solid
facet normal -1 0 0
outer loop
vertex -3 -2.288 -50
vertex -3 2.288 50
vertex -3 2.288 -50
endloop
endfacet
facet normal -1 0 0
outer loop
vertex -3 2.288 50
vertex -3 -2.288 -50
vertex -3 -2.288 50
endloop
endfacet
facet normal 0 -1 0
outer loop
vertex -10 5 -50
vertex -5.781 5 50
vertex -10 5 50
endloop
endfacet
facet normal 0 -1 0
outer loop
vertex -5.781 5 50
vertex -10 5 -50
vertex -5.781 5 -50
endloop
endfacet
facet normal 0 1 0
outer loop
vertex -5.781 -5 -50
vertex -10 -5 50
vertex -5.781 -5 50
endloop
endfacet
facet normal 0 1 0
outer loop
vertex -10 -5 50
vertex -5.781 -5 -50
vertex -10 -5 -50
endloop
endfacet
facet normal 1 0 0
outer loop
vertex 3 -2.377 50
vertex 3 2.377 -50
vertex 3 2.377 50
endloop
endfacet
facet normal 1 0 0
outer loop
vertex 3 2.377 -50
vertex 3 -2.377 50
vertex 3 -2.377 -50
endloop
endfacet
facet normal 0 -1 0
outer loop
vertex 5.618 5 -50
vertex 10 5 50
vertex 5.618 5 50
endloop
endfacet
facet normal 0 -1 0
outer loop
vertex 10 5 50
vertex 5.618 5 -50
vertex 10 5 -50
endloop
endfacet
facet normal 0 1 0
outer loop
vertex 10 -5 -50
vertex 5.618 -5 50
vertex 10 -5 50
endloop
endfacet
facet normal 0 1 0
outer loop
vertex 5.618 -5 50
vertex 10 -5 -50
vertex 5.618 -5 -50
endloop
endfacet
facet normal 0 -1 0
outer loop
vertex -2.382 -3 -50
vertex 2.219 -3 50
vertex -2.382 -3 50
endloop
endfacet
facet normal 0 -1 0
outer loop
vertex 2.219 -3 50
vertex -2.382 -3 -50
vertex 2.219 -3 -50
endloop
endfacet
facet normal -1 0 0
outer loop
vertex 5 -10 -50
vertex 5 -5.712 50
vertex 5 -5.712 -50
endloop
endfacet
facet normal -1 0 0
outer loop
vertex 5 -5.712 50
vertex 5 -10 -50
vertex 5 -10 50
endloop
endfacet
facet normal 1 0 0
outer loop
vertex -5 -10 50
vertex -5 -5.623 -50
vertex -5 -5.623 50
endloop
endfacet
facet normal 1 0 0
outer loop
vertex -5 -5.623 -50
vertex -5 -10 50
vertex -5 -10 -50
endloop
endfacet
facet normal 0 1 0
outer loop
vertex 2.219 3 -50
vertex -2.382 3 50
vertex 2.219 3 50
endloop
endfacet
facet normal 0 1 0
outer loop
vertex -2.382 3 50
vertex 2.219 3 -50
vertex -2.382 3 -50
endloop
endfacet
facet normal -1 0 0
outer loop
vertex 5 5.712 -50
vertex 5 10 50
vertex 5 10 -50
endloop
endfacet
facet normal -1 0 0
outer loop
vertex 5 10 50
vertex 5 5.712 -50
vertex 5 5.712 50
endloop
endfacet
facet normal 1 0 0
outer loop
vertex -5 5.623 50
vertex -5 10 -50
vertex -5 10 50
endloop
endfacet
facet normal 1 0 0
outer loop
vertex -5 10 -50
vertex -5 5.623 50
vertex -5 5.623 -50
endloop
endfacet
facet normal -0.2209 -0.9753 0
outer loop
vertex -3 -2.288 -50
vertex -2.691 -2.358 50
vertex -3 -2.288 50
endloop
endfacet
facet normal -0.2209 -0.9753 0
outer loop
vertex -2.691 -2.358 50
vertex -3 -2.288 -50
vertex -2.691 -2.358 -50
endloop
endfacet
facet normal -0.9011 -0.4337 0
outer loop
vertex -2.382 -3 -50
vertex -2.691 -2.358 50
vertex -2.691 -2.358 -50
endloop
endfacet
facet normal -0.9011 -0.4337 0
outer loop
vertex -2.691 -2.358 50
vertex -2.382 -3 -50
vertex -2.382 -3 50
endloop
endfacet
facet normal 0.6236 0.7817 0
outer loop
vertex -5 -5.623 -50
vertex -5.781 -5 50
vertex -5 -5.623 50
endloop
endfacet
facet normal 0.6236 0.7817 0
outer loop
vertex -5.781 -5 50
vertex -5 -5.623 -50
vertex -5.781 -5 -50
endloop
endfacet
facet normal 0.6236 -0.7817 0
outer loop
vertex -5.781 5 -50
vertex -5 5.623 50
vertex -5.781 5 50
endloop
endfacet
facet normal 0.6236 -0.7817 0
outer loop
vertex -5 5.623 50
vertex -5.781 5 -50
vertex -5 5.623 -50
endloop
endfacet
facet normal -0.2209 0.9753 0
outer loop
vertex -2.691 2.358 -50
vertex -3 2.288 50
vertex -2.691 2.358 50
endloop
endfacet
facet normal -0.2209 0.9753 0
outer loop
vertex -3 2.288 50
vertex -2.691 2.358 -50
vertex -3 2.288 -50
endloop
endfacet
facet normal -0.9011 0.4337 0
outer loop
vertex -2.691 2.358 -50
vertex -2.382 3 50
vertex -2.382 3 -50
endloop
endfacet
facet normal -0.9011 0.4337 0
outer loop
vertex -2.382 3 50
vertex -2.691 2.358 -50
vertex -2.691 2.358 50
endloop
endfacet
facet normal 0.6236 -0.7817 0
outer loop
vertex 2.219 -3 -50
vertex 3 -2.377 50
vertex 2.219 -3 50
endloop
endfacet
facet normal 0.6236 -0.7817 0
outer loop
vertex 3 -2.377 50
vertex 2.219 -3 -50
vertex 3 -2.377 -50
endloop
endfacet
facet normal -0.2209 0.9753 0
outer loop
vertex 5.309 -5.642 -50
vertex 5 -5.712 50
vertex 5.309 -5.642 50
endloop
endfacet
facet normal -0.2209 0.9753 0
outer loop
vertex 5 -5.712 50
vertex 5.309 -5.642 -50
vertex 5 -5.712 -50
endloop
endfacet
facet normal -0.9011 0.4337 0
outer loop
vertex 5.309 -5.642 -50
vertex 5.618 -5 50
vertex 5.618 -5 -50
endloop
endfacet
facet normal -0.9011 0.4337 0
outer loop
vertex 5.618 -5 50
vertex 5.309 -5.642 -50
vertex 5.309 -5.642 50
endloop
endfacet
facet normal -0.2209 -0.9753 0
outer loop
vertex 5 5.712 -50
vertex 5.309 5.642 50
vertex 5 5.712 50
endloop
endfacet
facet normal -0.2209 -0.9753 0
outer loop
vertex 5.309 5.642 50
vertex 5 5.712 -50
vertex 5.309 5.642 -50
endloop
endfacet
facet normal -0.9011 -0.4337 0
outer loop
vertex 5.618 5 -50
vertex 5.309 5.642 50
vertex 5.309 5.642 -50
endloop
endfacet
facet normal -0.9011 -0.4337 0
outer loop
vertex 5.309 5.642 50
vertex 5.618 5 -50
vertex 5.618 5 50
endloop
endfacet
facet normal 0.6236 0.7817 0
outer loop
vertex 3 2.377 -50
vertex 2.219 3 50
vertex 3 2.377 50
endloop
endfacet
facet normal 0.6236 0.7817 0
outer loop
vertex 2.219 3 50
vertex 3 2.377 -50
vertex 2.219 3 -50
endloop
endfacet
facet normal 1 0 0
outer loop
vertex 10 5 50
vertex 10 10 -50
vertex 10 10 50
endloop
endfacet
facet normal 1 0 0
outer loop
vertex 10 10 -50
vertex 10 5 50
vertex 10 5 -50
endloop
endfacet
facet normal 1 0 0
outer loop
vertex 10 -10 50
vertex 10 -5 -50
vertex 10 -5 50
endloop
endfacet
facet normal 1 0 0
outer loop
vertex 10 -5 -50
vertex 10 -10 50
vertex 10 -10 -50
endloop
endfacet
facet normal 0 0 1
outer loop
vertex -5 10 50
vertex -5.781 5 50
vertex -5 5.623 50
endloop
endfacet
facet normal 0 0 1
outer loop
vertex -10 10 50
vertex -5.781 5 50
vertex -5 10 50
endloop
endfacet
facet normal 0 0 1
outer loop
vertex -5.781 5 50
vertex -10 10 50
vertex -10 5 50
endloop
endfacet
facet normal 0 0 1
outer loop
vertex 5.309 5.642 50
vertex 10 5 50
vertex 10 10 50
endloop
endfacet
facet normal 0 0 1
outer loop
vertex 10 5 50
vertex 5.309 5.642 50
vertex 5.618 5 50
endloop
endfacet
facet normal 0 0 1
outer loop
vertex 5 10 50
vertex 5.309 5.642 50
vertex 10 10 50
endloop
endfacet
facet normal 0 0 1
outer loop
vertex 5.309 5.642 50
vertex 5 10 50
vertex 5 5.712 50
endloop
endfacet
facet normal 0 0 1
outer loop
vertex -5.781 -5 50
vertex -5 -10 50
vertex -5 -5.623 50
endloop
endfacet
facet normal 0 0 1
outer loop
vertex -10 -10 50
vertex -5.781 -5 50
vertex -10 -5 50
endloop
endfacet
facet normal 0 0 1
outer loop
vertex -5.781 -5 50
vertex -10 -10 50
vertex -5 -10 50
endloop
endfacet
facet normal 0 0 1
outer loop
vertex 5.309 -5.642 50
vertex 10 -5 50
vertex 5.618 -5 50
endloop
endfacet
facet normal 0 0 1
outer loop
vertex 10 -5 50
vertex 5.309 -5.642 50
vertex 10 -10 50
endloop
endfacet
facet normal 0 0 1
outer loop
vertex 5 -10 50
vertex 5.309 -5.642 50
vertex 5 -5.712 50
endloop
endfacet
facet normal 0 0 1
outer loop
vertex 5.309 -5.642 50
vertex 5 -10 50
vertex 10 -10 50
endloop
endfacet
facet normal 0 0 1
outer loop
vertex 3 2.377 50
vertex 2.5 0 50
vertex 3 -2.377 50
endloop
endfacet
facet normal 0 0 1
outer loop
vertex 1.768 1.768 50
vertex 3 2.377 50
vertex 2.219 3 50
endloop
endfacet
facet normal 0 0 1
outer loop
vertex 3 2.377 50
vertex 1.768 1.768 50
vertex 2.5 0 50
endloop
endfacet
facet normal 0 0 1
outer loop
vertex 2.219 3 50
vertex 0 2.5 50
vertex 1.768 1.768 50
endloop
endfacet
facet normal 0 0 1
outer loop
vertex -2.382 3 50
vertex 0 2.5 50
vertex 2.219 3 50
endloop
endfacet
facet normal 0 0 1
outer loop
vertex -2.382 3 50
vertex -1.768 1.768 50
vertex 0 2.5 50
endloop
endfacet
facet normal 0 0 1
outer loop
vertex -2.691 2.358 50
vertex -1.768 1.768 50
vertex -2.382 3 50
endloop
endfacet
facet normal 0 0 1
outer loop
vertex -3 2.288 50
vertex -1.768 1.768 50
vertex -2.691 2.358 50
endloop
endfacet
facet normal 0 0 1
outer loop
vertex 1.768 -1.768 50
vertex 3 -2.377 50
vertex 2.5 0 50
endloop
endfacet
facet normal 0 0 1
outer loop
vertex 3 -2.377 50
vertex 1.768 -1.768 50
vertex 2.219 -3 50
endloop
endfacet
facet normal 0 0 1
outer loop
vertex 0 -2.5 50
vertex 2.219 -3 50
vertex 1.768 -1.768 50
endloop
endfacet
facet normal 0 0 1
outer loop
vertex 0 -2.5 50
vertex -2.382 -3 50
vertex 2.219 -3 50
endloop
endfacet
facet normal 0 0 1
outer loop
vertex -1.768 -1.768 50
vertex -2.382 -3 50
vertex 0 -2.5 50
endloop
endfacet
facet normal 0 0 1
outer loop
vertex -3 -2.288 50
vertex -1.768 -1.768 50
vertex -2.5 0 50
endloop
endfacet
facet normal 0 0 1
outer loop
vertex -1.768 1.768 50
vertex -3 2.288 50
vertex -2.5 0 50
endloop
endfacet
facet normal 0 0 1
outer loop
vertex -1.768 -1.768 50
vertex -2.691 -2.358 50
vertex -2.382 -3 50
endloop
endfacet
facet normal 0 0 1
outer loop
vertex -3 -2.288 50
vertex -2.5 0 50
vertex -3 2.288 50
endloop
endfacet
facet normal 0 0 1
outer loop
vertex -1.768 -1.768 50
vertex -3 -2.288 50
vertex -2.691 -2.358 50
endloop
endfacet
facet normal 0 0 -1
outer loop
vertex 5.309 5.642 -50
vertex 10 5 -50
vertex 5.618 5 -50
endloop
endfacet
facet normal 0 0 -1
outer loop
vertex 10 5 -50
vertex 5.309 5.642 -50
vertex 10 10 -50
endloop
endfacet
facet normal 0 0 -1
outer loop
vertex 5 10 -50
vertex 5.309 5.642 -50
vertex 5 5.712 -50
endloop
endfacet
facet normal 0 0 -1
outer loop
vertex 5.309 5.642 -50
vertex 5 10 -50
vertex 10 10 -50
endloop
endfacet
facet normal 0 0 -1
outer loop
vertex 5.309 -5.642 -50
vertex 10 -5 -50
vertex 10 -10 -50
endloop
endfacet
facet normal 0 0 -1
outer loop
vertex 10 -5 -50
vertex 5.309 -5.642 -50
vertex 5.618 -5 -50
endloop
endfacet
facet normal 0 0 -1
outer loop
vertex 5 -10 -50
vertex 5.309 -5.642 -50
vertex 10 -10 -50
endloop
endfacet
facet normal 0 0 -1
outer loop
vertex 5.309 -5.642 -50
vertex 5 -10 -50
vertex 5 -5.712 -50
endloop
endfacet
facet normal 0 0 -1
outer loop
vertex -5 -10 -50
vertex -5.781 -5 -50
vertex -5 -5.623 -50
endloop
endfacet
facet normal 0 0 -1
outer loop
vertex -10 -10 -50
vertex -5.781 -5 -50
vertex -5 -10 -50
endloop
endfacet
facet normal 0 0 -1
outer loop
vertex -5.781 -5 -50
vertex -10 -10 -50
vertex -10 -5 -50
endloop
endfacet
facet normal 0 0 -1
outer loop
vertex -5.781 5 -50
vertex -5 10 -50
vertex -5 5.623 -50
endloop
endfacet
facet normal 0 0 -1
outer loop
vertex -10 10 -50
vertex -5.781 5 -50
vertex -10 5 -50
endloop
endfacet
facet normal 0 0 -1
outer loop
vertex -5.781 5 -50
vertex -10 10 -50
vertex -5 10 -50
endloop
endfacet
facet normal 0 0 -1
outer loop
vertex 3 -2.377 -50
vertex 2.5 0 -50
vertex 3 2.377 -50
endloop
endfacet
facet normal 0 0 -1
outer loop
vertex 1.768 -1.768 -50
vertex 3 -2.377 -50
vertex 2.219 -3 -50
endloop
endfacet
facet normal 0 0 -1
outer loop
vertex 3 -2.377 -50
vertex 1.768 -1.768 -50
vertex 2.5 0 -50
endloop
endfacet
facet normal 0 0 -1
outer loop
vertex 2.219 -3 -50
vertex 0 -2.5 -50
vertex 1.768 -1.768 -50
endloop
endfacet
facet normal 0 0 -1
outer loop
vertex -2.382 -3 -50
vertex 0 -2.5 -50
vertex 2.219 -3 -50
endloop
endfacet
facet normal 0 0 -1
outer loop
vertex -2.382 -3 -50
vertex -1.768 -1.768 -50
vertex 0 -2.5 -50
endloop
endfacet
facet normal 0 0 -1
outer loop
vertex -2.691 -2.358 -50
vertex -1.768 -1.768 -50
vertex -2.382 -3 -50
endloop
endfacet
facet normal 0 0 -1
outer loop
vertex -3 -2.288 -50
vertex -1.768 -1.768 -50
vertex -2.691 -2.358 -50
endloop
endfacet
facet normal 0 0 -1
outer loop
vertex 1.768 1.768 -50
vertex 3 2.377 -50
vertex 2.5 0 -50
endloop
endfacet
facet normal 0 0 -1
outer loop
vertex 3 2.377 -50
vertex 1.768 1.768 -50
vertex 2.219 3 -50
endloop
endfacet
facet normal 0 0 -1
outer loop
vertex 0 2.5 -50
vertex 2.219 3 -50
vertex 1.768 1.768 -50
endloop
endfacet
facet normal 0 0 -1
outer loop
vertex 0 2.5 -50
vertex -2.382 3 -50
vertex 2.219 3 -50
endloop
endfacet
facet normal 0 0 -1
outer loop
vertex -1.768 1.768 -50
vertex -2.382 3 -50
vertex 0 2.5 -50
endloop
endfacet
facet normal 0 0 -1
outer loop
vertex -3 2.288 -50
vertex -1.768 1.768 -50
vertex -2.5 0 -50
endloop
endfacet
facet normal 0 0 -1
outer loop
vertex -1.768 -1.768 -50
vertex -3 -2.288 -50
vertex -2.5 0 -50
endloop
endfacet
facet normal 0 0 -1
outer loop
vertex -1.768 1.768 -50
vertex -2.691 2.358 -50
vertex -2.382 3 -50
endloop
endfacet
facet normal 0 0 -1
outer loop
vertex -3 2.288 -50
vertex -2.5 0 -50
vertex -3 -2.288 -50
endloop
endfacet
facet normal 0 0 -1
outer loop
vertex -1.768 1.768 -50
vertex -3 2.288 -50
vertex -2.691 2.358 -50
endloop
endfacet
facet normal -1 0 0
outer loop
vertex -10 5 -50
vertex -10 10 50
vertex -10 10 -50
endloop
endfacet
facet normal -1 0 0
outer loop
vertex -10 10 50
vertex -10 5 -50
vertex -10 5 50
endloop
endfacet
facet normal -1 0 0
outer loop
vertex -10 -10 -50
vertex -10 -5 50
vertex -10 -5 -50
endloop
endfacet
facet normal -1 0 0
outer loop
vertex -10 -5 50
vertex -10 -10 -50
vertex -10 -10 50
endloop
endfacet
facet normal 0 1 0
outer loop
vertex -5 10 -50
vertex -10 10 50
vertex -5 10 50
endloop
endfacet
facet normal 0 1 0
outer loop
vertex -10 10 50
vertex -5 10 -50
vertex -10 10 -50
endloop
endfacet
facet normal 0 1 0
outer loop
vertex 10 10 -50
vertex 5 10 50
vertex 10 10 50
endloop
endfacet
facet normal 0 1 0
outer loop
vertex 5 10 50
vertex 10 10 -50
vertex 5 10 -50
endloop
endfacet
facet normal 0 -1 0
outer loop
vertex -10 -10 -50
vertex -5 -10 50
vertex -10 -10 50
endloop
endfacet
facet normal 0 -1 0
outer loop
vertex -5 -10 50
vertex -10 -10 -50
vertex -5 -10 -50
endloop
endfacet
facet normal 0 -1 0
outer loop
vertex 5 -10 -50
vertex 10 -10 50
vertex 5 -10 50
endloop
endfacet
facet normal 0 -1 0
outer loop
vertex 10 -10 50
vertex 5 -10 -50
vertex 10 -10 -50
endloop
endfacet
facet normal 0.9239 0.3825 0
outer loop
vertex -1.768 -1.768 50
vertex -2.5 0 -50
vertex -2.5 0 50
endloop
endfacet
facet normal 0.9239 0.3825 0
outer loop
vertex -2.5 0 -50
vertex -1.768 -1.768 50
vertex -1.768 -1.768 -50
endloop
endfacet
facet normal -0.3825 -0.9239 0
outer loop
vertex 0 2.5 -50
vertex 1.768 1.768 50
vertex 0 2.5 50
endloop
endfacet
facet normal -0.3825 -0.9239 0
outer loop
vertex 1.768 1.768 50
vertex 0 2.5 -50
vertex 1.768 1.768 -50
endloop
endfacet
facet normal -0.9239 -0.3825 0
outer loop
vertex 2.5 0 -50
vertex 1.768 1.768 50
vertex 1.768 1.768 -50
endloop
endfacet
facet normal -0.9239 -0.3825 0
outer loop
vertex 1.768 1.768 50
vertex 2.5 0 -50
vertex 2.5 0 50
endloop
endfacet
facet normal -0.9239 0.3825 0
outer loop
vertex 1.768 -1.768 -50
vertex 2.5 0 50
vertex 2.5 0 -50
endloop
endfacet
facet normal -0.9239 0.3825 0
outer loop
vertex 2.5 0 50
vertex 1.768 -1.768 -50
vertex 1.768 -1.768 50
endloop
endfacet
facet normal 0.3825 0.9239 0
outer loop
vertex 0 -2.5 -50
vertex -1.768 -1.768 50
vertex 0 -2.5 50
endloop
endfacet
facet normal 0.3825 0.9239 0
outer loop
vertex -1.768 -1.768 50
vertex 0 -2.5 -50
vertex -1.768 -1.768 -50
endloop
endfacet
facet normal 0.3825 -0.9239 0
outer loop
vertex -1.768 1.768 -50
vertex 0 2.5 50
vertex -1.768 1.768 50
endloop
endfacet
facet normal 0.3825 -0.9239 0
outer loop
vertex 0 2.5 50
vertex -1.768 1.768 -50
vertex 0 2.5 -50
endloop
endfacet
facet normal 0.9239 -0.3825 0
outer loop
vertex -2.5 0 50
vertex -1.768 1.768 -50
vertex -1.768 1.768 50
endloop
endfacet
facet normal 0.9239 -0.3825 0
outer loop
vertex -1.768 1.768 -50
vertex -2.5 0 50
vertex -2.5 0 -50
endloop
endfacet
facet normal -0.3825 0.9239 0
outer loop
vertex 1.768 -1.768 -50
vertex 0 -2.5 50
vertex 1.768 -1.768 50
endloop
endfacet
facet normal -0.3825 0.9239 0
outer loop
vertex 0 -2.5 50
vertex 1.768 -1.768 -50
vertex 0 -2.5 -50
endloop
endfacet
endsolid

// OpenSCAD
// Parameters
profile_width = 20.0; //[10.0:40.0:0.5]
profile_height = 20.0; //[10.0:40.0:0.5]
length = 100.0; //[50.0:200.0:1]
center = 1; //[0:1:1]
cornerHole = 1; //[0:1:1]
wall_thickness = 2.0; //[1.0:4.0:0.25]
slot_opening = 6.0; //[3.0:10.0:0.25]
slot_depth = 6.0; //[3.0:10.0:0.25]
slot_cavity_width = 10.0; //[6.0:16.0:0.25]
center_bore_diameter = 5.0; //[3.0:10.0:0.25]
corner_hole_diameter = 4.2; //[2.0:8.0:0.1]
corner_hole_offset = 6.0; //[4.0:10.0:0.25]
overlap = 1.0; //[0.5:2.0:0.1]

// Extrusion - complete geometry
module extrusion() {
  color("Silver") {
    difference() {
      // Main body
      cube([profile_width, profile_height, length], center=true);
      
      // Center bore
      translate([0, 0, 0])
        cylinder(r=center_bore_diameter/2, h=length + 2*overlap, center=true);
      
      // T-slot channels
      union() {
        // X-direction slots
        for (i = [-1, 1]) {
          translate([i * (profile_width/2 - (slot_depth + 2*overlap)/2 + overlap), 0, 0]) {
            cube([slot_depth + 2*overlap, slot_opening, length + 2*overlap], center=true);
            cube([slot_depth + 2*overlap, slot_cavity_width, length + 2*overlap], center=true);
          }
        }
        // Y-direction slots
        for (i = [-1, 1]) {
          translate([0, i * (profile_height/2 - (slot_depth + 2*overlap)/2 + overlap), 0]) {
            cube([slot_opening, slot_depth + 2*overlap, length + 2*overlap], center=true);
            cube([slot_cavity_width, slot_depth + 2*overlap, length + 2*overlap], center=true);
          }
        }
      }
      
      // Corner holes
      if (cornerHole) {
        for (x = [-1, 1], y = [-1, 1]) {
          translate([x * (profile_width/2 - corner_hole_offset), y * (profile_height/2 - corner_hole_offset), 0])
            cylinder(r=corner_hole_diameter/2, h=length + 2*overlap, center=true);
        }
      }
    }
  }
}

// Box Corner Profile Section - complete geometry
module box_corner_profile_section() {
  color("DimGray") {
    cube([wall_thickness, wall_thickness, length], center=true);
  }
}

// Box Corner Profile Sections - complete geometry
module box_corner_profile_sections() {
  union() {
    box_corner_profile_section();
    mirror([1, 0, 0]) box_corner_profile_section();
    mirror([0, 1, 0]) box_corner_profile_section();
    mirror([1, 1, 0]) box_corner_profile_section();
  }
}

// Extrusion Cross Section - complete geometry
module extrusion_cross_section() {
  difference() {
    extrusion();
    box_corner_profile_sections();
  }
}

// Assembly
module assembly() {
  extrusion_cross_section();
}

assembly();
